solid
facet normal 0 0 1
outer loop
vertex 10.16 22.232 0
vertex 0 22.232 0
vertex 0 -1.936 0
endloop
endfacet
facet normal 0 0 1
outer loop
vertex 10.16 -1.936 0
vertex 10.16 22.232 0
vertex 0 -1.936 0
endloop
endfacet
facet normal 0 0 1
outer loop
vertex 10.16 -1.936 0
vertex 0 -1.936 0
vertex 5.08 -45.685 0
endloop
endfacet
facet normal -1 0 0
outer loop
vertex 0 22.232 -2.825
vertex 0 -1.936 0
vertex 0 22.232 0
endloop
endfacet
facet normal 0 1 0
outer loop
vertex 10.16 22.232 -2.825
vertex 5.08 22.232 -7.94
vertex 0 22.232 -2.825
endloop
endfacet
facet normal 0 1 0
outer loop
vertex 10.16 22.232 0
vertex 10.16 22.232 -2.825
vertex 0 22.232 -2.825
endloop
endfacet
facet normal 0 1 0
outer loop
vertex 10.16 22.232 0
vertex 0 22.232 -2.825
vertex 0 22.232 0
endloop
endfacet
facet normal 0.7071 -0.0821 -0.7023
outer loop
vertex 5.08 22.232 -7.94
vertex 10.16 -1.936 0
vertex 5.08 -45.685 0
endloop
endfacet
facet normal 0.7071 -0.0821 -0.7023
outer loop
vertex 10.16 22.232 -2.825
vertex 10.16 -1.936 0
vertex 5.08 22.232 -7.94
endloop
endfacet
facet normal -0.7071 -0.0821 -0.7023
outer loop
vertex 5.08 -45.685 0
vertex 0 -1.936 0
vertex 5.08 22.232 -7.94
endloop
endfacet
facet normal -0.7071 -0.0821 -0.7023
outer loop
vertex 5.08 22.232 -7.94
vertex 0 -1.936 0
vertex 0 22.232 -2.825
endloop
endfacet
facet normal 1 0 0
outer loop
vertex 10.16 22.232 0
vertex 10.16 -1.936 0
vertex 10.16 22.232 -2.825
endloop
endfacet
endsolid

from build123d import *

# Parameters (mm, degrees)
F1_DEPTH = 10.16
F2_SIZE  = 5.07999


# Not quite as in the source:
# - a fillet or chamfer is up to 0.001 mm smaller than in the source, because OpenCascade refuses the exact size


with BuildPart() as f1:
    # F0 (on Right) → F1 (new body)
    with BuildSketch(Plane.YZ):
        Polygon((-45.6850975752, 0), (22.2317874432, -7.939924486), (22.2317874432, 0), align=None)
    extrude(amount=F1_DEPTH)

    # F2 (size 5.08 in the source; OpenCascade refuses exactly that, so slightly less here)
    f2_edges = [f1.edges().sort_by_distance(p)[0] for p in [
        (10.16, -11.726655, -3.969962),
        (0, -11.726655, -3.969962),
    ]]
    chamfer(f2_edges, length=F2_SIZE)


solid = f1.part
